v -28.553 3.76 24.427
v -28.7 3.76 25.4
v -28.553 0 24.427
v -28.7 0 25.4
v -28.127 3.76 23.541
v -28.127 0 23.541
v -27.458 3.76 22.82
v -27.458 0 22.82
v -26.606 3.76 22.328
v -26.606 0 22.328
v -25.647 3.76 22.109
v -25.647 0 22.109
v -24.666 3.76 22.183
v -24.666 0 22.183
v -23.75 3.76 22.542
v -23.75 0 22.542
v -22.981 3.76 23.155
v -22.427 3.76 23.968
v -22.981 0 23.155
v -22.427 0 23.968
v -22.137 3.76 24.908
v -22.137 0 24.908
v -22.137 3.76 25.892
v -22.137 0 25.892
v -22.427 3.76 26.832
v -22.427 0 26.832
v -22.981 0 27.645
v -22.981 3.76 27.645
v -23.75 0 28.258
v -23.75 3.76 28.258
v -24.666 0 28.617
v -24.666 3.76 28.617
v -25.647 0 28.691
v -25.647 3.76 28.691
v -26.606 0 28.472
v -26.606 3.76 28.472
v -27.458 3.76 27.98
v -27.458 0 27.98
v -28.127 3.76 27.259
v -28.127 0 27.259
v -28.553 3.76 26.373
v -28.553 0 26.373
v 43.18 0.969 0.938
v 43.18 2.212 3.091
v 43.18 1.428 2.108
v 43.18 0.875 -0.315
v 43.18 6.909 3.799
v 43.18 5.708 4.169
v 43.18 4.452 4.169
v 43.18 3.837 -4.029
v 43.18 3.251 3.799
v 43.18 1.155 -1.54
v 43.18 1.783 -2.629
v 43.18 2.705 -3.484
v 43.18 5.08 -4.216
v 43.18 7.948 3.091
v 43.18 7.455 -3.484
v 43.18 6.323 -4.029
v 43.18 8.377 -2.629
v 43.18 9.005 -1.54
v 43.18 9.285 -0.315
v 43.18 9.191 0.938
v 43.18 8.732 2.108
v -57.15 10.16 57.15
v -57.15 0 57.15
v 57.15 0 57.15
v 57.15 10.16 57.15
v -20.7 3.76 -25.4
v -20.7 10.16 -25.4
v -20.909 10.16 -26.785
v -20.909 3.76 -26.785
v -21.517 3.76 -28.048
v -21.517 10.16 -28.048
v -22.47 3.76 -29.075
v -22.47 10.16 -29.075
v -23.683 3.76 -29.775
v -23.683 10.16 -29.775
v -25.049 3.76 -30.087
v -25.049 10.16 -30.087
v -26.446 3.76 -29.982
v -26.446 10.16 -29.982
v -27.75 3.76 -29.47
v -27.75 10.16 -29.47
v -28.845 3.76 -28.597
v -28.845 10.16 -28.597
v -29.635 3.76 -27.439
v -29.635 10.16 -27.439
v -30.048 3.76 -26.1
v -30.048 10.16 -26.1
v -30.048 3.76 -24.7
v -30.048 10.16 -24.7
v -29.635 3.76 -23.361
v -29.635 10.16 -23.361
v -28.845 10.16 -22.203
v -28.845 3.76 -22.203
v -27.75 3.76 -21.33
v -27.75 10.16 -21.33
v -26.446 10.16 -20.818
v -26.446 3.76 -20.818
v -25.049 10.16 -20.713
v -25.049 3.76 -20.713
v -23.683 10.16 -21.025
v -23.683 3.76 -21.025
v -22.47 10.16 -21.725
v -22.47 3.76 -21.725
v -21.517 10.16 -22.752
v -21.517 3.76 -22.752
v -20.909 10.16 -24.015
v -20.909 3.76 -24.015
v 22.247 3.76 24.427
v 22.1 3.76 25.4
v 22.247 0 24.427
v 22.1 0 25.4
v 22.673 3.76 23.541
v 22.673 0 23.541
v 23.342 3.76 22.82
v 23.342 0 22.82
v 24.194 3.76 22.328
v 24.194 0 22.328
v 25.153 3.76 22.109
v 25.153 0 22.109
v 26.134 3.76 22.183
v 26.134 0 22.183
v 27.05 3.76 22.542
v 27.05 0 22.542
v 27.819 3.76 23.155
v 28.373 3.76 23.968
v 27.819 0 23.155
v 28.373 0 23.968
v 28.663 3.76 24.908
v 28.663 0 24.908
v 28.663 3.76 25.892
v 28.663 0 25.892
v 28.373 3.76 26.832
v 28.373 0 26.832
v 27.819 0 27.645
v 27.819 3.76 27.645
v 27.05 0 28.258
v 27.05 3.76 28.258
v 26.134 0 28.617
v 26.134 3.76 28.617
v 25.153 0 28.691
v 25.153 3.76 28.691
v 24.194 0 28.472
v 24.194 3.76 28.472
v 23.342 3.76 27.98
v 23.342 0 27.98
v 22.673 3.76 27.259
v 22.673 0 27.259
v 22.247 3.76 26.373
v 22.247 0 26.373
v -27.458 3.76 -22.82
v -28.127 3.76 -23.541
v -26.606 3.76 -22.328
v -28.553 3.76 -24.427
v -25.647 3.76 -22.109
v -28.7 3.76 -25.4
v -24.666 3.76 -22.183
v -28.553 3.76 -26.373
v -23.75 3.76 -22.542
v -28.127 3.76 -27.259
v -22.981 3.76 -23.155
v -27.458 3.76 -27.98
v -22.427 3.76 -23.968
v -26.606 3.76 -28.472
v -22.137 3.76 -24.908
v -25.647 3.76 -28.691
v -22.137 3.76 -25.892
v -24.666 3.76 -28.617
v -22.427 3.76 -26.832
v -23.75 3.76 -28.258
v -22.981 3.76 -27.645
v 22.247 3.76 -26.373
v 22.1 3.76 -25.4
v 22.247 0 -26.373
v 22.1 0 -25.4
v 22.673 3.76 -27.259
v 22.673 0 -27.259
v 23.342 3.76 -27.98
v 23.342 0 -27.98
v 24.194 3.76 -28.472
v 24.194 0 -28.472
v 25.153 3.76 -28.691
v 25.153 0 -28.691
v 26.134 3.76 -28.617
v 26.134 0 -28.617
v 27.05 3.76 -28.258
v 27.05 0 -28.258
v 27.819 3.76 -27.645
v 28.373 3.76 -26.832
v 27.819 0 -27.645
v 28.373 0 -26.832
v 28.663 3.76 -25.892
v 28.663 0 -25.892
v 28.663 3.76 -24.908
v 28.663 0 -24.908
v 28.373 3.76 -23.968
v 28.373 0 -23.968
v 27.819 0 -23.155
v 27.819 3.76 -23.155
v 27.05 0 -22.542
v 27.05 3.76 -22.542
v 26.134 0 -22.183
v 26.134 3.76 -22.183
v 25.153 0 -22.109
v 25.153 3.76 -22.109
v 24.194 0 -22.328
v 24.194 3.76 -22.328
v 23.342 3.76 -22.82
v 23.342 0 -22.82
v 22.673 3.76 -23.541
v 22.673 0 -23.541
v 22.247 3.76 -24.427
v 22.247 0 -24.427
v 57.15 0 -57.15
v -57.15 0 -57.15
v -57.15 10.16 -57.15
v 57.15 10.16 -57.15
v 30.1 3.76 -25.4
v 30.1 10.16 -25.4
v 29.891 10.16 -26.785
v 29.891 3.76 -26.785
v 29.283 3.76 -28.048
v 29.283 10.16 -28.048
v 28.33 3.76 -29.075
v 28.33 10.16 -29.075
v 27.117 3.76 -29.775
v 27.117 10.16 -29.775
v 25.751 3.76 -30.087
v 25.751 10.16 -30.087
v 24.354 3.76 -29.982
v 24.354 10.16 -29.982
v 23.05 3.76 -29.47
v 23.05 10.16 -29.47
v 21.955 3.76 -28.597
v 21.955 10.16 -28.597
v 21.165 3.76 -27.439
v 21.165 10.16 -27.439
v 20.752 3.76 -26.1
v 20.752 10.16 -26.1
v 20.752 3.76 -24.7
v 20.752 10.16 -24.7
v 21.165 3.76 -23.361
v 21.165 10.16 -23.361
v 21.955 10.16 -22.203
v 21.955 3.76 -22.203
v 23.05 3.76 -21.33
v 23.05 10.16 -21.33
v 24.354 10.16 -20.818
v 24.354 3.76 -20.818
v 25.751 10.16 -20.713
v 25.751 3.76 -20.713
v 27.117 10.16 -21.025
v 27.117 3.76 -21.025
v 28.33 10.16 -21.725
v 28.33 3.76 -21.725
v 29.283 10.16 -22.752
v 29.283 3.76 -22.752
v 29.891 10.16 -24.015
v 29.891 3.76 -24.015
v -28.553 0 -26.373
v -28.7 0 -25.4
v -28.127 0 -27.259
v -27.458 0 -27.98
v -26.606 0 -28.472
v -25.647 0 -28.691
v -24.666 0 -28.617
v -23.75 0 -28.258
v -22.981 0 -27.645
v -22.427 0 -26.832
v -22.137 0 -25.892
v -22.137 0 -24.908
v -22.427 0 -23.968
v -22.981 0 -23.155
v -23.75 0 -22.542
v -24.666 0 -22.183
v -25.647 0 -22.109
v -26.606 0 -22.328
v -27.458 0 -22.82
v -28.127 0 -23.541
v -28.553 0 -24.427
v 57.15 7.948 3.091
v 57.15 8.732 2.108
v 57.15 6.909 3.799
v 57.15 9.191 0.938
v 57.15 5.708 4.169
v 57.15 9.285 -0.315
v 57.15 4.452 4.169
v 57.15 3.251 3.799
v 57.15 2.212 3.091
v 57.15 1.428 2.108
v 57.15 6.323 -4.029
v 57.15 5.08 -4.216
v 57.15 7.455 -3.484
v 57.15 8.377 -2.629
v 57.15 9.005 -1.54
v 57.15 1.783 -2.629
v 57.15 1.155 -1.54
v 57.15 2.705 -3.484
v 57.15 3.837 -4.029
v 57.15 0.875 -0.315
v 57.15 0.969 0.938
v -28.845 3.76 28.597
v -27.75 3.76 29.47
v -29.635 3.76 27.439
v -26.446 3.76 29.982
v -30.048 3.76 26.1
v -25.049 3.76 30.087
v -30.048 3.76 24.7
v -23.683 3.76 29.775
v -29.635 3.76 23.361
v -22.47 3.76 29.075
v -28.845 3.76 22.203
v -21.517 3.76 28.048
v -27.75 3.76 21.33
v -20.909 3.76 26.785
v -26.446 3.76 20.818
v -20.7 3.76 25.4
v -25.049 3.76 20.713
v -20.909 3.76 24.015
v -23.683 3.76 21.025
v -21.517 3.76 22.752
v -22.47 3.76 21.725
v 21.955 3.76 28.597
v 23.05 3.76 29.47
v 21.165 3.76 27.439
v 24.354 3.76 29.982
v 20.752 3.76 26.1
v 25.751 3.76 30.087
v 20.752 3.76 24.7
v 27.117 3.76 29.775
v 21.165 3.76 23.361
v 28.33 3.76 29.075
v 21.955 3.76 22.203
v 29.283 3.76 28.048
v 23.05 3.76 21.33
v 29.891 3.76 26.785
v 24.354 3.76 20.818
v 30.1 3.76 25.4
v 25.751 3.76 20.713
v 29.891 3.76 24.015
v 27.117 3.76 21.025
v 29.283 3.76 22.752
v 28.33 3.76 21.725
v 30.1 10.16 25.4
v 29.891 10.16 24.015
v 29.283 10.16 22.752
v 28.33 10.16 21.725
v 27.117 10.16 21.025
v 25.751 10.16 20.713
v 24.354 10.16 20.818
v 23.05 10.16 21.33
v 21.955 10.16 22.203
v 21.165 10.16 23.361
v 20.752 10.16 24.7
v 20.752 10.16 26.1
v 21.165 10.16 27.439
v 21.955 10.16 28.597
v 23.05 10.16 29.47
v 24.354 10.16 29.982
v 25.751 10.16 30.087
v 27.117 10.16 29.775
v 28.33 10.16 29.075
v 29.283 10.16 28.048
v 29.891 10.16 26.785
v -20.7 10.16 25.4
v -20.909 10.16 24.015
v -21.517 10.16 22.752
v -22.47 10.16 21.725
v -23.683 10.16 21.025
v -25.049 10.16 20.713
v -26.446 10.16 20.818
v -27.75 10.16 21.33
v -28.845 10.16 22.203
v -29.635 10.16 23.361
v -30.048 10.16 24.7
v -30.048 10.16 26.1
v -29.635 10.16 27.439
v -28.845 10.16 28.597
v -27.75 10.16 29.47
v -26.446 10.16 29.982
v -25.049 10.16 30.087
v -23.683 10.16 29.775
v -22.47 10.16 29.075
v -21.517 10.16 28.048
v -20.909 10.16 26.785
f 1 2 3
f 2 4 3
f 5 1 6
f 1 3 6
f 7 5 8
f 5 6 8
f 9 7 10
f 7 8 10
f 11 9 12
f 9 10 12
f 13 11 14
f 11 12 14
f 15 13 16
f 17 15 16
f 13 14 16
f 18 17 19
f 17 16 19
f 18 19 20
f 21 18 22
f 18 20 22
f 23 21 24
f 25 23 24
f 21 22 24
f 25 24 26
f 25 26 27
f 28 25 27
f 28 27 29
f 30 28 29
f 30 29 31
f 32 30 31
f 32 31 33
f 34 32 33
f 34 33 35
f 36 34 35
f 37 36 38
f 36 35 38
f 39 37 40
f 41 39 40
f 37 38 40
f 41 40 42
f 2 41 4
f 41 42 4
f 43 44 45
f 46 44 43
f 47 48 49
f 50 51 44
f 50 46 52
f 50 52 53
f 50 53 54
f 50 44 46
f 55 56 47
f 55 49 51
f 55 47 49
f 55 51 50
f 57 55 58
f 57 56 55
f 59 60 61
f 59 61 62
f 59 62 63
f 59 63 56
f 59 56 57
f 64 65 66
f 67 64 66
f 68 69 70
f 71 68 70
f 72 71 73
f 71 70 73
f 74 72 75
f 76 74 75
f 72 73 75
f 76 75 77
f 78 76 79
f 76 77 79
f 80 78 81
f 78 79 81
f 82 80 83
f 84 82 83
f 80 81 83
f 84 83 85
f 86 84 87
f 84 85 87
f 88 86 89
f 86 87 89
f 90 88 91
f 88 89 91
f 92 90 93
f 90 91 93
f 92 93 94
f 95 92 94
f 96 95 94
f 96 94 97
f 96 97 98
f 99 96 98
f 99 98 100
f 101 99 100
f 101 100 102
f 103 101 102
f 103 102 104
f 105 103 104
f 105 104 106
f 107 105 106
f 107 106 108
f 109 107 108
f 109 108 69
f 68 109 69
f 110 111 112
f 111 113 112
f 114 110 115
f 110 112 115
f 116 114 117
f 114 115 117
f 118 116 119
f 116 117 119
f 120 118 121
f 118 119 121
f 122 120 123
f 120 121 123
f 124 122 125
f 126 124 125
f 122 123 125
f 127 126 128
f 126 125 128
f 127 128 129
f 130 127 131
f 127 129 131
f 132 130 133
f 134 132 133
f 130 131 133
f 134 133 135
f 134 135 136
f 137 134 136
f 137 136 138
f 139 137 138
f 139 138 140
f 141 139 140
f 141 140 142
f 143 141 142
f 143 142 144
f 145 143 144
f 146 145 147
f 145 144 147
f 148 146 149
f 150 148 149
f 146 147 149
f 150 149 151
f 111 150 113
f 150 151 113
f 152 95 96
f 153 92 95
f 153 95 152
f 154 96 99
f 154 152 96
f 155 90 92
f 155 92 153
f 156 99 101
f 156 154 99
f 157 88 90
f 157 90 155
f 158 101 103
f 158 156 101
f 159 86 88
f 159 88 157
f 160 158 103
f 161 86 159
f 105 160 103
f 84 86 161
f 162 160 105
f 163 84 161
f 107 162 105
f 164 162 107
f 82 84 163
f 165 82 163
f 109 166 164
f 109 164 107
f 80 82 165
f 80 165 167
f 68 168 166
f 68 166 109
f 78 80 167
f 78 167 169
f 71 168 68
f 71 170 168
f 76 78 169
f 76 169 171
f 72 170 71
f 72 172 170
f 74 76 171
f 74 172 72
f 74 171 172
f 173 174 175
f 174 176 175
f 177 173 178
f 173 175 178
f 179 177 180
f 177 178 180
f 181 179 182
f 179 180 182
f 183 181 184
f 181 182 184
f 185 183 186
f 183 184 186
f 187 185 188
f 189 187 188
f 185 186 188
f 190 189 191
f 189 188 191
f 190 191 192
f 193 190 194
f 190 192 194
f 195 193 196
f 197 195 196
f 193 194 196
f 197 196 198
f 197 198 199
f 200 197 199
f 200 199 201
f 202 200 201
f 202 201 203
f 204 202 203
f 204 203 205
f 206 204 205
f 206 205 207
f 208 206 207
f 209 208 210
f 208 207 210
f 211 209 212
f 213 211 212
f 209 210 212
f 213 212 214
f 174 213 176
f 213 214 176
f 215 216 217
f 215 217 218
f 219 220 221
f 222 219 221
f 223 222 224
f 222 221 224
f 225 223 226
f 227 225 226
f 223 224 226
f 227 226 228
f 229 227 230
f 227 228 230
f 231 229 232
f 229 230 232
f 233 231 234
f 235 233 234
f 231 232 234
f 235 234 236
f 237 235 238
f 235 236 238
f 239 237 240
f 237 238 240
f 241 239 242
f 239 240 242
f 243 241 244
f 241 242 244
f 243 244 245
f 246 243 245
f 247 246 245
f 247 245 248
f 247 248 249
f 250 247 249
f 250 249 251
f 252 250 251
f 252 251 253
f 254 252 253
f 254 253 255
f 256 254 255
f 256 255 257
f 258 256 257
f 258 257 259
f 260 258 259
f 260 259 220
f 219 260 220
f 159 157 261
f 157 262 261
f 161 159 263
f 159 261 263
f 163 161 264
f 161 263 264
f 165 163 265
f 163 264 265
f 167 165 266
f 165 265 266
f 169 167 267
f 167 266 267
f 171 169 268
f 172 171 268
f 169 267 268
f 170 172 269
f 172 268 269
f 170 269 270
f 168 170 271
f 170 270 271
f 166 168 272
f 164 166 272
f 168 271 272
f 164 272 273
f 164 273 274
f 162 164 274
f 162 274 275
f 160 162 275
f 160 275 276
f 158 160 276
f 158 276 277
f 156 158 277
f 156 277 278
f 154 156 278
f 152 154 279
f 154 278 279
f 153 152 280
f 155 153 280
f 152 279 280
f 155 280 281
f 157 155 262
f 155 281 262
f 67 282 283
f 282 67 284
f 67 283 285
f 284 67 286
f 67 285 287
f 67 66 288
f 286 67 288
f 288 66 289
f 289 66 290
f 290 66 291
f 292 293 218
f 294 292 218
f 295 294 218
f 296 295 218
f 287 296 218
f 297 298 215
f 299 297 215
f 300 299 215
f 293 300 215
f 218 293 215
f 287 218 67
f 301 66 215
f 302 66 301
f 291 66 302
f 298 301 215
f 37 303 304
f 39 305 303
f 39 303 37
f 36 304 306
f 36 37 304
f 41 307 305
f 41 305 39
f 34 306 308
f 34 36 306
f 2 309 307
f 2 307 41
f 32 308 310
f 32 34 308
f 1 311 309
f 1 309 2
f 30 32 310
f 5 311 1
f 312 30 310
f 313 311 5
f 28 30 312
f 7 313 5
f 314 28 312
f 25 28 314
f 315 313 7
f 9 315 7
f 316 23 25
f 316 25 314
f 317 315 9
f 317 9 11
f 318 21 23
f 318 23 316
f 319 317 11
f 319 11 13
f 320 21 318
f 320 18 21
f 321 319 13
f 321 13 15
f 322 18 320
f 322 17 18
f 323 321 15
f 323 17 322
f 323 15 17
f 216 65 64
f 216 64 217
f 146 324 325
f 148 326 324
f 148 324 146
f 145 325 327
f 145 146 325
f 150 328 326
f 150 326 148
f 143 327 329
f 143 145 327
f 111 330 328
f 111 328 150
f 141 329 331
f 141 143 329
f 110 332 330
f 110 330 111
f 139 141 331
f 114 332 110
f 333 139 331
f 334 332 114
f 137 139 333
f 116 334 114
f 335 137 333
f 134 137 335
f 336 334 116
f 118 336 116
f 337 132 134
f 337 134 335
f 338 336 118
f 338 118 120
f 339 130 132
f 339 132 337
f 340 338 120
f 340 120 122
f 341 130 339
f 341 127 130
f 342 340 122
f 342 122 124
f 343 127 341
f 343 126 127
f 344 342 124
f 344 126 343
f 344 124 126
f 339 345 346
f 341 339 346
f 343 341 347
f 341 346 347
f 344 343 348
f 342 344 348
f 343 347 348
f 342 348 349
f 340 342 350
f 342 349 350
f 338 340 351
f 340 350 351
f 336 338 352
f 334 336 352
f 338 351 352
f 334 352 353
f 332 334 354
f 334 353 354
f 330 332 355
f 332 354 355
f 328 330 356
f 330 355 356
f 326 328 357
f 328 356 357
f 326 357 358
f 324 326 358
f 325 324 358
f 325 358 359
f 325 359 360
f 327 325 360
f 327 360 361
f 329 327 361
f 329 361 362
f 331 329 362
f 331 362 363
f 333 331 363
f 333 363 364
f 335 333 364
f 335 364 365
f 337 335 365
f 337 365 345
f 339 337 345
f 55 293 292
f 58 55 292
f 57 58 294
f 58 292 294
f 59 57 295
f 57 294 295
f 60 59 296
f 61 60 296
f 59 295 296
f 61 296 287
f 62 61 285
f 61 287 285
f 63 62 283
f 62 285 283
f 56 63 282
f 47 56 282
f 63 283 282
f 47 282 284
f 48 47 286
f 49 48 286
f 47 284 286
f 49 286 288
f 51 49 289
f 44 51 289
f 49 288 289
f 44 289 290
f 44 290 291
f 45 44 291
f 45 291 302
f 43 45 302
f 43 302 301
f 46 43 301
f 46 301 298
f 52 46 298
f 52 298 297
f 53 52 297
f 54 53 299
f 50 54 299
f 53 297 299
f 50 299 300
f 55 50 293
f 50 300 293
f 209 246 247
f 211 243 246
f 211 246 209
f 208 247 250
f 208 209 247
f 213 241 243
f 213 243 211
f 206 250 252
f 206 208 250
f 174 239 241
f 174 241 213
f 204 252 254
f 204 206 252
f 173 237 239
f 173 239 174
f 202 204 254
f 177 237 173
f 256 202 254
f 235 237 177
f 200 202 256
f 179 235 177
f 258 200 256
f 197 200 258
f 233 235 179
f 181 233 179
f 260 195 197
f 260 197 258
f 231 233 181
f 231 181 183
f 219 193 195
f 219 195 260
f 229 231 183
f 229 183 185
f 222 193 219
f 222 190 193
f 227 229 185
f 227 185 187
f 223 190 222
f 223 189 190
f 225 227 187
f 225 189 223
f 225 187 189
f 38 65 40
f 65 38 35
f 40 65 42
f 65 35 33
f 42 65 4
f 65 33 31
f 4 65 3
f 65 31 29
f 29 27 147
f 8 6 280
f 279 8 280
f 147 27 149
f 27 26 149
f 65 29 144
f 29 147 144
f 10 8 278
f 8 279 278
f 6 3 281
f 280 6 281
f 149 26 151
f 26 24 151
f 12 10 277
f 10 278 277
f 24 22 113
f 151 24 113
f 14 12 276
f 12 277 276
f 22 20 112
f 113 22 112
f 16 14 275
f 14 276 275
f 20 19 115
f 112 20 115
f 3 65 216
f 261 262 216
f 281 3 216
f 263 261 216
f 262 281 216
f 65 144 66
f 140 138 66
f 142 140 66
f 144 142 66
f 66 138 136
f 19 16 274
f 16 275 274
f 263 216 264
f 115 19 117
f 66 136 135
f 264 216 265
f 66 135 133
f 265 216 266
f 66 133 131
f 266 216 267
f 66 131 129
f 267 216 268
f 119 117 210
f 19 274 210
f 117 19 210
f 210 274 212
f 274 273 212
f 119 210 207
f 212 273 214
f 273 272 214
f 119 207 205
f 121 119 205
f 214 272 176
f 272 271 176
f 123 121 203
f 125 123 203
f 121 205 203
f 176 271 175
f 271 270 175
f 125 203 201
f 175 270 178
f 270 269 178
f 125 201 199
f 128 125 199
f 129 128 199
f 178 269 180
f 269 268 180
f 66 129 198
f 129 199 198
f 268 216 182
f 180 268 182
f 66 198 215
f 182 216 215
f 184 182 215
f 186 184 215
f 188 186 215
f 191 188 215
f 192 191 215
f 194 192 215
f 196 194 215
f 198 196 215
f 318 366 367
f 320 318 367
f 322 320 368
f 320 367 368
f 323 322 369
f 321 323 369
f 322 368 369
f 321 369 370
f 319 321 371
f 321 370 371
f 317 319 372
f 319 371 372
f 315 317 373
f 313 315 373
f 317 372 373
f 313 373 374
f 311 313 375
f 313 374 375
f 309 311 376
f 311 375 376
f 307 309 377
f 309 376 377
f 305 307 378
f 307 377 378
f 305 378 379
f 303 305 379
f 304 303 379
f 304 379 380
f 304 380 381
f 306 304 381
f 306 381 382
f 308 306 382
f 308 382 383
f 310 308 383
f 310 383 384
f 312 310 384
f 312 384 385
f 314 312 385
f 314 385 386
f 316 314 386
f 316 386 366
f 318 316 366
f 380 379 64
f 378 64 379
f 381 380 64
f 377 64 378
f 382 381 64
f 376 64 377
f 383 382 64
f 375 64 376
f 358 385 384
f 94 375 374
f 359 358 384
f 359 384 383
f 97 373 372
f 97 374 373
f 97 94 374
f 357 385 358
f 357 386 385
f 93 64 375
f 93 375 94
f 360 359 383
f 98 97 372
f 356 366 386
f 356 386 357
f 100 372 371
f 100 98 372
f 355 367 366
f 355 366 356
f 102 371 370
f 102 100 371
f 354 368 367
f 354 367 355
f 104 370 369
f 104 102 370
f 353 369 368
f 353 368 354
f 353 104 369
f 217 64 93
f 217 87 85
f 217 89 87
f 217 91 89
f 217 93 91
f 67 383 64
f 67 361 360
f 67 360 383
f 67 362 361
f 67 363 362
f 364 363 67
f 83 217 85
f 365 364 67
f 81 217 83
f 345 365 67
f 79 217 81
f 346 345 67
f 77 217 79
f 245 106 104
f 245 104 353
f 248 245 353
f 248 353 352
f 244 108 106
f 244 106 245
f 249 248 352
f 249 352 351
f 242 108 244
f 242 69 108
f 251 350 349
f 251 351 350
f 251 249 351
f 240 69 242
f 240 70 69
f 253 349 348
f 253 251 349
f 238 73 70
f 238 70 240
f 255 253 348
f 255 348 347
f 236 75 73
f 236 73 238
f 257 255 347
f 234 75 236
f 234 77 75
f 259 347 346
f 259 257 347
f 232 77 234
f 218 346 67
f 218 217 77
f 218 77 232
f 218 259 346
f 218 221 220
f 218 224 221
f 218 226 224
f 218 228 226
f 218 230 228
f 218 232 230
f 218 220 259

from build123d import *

# Parameters (mm, degrees)
SKETCH1_W                      = 114.3
SKETCH1_H                      = 114.3
BOSS_EXTRUDE1_DEPTH            = 10.16
CBORE_FOR_M6_SHCS1_D           = 6.6
CBORE_FOR_M6_SHCS1_CBORE_D     = 9.4
CBORE_FOR_M6_SHCS1_CBORE_DEPTH = 6.4
SKETCH6_R                      = 4.2164
CUT_EXTRUDE1_DEPTH             = 13.97


with BuildPart() as part:
    # Sketch1 → Boss-Extrude1 (new body)
    with BuildSketch(Plane(origin=(0, 0, 0), x_dir=(1, 0, 0), z_dir=(0, 1, 0))):
        Rectangle(SKETCH1_W, SKETCH1_H)
    extrude(amount=BOSS_EXTRUDE1_DEPTH)

    # CBORE for M6 SHCS1 (through all)
    with Locations(Plane(origin=(0, 10.16, 0), x_dir=(1, 0, 0), z_dir=(0, 1, 0))):
        with Locations((-25.4, 25.4), (25.4, 25.4), (25.4, -25.4), (-25.4, -25.4)):
            CounterBoreHole(CBORE_FOR_M6_SHCS1_D / 2, CBORE_FOR_M6_SHCS1_CBORE_D / 2, CBORE_FOR_M6_SHCS1_CBORE_DEPTH)

    # Sketch6 → Cut-Extrude1 (cut)
    with BuildSketch(Plane(origin=(57.15, 0, 0), x_dir=(0, 0, -1), z_dir=(1, 0, 0))):
        with Locations((0, 5.08)):
            Circle(SKETCH6_R)
    extrude(amount=-CUT_EXTRUDE1_DEPTH, mode=Mode.SUBTRACT)


solid = part.part
